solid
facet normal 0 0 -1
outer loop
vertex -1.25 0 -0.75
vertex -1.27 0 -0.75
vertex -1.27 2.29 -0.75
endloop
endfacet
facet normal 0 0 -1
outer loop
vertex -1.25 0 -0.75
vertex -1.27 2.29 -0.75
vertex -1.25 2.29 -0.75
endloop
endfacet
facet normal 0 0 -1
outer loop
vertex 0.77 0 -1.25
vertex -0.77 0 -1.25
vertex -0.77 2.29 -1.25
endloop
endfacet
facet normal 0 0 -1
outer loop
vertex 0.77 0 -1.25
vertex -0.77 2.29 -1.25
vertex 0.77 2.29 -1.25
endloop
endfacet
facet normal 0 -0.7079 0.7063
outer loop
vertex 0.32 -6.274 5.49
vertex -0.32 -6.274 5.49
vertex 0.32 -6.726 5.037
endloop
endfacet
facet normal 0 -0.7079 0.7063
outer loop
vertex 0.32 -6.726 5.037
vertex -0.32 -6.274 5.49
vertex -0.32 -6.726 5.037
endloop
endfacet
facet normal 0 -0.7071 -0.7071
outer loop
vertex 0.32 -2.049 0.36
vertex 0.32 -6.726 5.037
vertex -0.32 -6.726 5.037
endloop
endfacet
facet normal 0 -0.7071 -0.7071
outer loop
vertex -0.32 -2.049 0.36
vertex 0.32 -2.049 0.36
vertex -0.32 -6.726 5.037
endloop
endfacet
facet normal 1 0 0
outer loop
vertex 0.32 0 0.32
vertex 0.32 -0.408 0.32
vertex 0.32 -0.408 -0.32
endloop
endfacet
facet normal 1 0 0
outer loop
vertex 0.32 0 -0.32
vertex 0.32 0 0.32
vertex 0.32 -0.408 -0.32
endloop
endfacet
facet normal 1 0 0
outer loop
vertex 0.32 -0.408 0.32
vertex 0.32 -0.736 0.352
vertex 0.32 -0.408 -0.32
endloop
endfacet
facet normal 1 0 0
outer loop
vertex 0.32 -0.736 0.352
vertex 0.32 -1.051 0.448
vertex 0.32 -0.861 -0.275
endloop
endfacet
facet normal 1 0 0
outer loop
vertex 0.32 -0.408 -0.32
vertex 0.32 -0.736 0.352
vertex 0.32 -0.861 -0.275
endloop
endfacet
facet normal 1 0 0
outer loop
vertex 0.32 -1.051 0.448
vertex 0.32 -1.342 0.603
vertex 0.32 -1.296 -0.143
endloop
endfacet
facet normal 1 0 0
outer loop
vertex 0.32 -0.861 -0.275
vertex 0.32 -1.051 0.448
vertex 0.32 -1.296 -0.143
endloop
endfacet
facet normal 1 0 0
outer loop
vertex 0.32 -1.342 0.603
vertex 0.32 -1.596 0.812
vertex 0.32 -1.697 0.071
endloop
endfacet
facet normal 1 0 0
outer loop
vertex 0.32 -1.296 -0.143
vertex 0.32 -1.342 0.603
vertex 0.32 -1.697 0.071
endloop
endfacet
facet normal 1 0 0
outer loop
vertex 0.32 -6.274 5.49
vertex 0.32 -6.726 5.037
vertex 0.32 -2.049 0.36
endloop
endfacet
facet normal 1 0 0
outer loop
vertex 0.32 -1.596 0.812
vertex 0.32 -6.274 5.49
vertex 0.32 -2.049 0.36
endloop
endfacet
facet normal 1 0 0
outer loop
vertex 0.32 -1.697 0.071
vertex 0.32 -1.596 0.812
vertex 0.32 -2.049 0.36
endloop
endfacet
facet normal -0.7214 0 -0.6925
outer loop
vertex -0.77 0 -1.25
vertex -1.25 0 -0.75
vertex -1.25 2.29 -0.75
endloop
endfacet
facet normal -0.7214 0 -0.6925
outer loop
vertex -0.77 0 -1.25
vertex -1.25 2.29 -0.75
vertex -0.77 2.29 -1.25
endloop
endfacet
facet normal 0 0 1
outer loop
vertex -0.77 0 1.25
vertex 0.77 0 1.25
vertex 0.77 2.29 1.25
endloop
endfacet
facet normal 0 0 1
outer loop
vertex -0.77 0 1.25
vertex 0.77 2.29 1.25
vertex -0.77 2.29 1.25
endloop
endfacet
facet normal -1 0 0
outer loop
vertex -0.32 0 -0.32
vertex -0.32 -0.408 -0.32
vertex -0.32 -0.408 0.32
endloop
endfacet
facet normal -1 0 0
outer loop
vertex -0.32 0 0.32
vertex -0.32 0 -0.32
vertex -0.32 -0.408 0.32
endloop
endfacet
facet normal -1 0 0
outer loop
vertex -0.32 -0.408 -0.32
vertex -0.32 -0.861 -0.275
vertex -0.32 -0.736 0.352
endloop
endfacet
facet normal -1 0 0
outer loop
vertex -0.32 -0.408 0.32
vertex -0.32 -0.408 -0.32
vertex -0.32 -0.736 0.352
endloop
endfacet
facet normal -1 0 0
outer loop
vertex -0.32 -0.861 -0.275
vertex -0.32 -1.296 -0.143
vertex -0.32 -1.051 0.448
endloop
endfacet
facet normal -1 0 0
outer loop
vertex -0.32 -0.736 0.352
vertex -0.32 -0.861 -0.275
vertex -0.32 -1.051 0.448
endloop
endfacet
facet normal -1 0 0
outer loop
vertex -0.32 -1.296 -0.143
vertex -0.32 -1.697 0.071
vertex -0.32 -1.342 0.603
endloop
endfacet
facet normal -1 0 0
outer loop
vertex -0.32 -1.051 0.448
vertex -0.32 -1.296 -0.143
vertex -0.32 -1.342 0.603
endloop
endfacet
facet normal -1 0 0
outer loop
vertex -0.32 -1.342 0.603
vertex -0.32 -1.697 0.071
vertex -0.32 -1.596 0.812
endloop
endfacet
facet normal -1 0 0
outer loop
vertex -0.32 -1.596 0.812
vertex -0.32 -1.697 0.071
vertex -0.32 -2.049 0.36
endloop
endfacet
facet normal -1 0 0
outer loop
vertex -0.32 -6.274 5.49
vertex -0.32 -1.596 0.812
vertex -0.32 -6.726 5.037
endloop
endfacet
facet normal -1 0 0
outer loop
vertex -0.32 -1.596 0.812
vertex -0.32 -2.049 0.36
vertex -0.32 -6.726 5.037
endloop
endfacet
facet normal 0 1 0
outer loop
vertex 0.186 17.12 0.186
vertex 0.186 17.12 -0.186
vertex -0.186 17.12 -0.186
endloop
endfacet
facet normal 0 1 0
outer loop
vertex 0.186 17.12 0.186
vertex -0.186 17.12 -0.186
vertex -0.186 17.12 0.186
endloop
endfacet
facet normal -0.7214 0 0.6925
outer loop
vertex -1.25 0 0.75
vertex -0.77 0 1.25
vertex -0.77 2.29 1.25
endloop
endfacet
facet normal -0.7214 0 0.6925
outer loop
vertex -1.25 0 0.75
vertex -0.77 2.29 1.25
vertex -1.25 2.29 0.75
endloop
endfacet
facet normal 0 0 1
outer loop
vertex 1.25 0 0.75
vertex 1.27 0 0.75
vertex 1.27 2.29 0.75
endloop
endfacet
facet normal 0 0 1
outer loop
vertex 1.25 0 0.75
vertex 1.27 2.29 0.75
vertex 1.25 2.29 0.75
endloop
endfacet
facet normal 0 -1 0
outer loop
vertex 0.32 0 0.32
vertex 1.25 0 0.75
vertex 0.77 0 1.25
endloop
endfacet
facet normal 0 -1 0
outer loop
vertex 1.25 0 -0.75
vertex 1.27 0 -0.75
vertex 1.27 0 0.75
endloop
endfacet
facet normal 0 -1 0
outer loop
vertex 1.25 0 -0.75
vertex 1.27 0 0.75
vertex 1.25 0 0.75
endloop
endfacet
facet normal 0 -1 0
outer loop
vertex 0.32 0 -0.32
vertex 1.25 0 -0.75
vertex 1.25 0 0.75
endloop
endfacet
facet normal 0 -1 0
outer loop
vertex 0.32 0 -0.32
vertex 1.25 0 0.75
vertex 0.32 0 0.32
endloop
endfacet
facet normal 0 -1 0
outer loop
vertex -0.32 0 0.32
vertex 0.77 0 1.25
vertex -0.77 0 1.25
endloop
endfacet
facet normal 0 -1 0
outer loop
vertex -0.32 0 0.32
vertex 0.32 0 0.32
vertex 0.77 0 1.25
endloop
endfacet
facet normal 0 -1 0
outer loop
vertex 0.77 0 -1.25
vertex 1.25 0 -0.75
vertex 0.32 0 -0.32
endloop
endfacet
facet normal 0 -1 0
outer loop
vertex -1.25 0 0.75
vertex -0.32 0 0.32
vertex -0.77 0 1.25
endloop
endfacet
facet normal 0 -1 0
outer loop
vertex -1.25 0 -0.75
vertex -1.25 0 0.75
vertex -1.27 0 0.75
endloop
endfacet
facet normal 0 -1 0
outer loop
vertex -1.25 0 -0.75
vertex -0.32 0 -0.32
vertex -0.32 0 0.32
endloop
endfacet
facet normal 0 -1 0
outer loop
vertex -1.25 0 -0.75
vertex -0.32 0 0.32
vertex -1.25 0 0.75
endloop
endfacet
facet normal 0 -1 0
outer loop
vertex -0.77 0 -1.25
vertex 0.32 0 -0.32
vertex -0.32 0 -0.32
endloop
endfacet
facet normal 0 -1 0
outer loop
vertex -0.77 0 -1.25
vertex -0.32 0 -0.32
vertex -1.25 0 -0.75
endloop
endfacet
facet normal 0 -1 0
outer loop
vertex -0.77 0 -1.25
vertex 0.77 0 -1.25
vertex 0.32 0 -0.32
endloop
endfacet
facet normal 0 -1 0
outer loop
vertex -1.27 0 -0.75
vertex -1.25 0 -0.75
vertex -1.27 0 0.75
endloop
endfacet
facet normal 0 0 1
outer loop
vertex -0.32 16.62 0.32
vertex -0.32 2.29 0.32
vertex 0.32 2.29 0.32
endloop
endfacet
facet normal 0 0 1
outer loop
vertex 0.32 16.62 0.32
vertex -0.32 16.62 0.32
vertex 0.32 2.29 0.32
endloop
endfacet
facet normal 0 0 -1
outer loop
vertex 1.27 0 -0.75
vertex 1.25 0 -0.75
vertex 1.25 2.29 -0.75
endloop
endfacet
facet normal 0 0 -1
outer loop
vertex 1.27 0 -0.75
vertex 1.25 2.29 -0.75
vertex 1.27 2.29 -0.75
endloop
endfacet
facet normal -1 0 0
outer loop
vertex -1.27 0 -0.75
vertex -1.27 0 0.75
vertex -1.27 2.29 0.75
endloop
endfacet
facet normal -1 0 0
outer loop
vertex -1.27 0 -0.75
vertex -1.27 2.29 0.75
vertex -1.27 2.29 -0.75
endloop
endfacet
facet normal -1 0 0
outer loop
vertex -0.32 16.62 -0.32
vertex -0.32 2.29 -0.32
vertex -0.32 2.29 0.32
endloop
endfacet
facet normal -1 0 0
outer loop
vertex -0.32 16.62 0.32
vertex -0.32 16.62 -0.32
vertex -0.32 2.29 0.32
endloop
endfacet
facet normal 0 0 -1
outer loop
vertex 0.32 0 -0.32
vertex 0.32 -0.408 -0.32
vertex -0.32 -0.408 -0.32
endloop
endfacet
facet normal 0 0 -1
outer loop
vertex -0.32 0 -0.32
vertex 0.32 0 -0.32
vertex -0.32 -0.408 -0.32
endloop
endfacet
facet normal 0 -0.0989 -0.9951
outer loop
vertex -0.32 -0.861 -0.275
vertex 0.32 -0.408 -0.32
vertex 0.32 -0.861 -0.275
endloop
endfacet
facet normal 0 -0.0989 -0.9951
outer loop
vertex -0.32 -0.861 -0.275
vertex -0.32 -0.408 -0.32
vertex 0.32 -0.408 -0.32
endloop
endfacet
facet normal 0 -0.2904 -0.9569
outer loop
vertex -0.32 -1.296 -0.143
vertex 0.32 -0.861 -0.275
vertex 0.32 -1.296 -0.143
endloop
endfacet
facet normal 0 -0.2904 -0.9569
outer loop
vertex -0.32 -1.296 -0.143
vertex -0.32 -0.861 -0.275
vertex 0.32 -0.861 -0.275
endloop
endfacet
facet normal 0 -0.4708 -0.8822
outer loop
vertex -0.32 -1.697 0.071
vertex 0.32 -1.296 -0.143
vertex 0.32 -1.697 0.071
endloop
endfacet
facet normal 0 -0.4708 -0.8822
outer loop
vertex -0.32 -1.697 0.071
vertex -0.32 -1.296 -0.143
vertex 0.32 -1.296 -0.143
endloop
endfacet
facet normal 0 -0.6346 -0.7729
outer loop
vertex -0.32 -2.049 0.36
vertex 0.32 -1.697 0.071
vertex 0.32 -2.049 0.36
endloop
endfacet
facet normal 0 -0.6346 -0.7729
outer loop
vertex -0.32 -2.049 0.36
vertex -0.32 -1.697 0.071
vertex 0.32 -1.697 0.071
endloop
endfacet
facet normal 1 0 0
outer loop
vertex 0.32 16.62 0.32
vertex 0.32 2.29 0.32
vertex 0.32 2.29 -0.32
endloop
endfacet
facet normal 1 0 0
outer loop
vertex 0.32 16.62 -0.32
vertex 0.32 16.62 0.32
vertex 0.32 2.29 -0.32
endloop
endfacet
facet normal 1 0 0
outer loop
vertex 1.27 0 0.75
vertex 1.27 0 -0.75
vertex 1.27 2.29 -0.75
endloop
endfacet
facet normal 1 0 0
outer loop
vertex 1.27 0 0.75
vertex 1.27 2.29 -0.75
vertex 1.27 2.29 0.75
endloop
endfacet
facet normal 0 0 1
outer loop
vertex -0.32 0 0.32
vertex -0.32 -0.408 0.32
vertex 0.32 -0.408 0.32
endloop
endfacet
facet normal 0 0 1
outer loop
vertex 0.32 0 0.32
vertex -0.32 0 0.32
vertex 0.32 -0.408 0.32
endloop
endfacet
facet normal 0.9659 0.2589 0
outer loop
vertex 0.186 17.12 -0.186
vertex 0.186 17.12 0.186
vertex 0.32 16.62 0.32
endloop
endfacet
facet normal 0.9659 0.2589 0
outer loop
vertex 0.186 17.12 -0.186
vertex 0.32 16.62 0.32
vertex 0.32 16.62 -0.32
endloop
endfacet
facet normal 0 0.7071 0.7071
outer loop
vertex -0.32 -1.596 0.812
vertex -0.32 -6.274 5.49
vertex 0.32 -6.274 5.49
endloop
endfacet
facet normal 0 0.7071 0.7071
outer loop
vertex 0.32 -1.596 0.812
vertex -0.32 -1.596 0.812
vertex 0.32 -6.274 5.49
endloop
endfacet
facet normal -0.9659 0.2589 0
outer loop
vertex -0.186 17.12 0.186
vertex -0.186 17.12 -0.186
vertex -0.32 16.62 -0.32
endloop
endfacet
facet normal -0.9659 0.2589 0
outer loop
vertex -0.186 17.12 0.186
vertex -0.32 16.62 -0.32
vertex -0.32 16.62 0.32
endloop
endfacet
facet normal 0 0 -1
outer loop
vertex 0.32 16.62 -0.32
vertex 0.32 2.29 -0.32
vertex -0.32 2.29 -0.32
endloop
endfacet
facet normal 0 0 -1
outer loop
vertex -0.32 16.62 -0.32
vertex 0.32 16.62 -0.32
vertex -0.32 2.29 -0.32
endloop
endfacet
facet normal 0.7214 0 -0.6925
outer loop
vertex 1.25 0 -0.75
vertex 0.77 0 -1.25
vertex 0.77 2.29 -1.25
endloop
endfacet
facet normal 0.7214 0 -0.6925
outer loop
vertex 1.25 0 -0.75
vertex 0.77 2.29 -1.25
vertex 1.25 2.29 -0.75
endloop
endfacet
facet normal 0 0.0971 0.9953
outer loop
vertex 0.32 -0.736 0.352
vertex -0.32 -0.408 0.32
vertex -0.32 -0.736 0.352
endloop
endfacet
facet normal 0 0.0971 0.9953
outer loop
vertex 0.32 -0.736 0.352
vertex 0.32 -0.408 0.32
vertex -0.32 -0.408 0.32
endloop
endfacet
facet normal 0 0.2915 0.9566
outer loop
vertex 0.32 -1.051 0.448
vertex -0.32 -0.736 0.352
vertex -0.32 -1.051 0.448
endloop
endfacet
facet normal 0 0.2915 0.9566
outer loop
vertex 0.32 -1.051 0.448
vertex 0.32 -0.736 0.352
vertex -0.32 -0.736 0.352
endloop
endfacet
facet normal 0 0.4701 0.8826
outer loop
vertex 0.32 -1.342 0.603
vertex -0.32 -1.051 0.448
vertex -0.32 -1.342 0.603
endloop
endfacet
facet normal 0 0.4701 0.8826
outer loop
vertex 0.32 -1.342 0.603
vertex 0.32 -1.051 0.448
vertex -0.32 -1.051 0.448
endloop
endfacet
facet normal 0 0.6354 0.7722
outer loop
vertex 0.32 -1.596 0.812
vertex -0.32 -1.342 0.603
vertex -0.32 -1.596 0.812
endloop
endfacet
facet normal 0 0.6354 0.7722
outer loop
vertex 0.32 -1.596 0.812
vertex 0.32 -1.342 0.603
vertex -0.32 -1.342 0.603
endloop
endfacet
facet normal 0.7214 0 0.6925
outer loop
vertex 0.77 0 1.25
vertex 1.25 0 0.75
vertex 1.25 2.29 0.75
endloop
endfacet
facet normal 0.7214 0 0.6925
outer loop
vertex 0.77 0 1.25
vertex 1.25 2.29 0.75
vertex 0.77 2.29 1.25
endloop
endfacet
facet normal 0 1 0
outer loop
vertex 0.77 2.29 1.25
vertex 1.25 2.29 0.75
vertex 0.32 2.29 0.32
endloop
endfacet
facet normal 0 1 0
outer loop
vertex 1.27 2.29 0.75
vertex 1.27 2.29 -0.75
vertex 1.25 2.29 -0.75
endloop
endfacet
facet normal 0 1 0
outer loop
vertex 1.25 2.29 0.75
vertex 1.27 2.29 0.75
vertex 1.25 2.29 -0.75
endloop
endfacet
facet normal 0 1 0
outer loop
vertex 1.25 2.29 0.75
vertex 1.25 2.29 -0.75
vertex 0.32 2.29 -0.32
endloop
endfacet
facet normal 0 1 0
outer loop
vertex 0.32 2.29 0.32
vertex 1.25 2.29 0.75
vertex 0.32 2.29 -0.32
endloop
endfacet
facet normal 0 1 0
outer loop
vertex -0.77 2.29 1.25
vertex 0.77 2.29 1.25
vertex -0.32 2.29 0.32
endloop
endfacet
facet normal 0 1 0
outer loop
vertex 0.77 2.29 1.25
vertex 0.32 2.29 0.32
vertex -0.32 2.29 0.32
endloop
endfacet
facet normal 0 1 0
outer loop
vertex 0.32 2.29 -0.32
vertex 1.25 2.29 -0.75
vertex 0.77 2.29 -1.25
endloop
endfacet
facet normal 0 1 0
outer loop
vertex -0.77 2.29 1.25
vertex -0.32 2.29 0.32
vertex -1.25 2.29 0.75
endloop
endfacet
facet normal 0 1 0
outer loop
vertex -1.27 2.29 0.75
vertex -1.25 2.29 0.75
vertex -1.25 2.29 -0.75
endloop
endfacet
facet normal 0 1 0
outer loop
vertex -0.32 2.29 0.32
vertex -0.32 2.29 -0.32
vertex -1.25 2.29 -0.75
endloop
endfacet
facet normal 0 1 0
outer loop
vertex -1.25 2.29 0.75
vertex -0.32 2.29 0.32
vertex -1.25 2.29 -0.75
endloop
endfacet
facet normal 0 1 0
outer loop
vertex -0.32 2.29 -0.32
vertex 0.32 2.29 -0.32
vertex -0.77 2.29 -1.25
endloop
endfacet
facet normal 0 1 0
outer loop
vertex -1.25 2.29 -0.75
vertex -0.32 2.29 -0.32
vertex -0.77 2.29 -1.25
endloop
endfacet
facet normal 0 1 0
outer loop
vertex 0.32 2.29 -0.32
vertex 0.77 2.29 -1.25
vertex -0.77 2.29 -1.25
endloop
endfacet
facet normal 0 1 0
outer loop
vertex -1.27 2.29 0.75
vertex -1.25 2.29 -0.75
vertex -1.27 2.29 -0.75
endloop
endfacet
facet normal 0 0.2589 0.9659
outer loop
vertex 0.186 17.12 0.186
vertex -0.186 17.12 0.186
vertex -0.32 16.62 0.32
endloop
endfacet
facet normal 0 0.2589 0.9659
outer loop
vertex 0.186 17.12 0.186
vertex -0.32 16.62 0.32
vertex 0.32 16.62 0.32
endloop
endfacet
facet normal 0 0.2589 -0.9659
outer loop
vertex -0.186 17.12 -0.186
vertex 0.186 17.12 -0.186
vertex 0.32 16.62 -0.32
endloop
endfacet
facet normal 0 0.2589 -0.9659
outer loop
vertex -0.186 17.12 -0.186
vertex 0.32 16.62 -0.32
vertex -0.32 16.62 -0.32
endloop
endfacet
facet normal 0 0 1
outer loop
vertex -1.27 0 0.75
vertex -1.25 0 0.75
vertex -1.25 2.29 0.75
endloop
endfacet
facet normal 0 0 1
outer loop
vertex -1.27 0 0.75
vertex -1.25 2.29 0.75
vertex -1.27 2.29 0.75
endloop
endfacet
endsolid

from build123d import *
from OCP.BRepFilletAPI import BRepFilletAPI_MakeChamfer

# Parameters (mm, degrees)
BOSS_EXTRUDE1_DEPTH = 2.29
SKETCH3_W           = 0.64
SKETCH3_H           = 0.64
CHAMFER3_SIZE       = 0.5
CHAMFER3_SIZE2      = 0.133974596


with BuildPart() as part:
    # Sketch1 → Boss-Extrude1 (new body)
    with BuildSketch(Plane(origin=(0, 0, 0), x_dir=(1, 0, 0), z_dir=(0, 1, 0))):
        Polygon((-0.77, 1.25), (0.77, 1.25), (1.25, 0.75), (1.27, 0.75), (1.27, -0.75), (1.25, -0.75), (0.77, -1.25), (-0.77, -1.25), (-1.25, -0.75), (-1.27, -0.75), (-1.27, 0.75), (-1.25, 0.75), align=None)
    extrude(amount=BOSS_EXTRUDE1_DEPTH)

    # Sweep1: sweep along a path in Sketch2
    with BuildLine(Plane(origin=(0, 0, 0), x_dir=(0, 0, -1), z_dir=(1, 0, 0))) as sweep1_path:
        Line((0, 17.12), (0, -0.408142235))
        ThreePointArc((0, -0.408142235), (-0.152240935, -1.1735091), (-0.585786438, -1.822355798))
        Line((-0.585786438, -1.822355798), (-5.26343064, -6.5))
    # Sketch3 → Sweep1 (sweep)
    with BuildSketch(Plane(origin=(0, 17.12, 0), x_dir=(1, 0, 0), z_dir=(0, 1, 0))):
        Rectangle(SKETCH3_W, SKETCH3_H)
    sweep(path=sweep1_path.line)

    # Chamfer3: one chamfer whose edges measure the first distance from different faces: ONE call of the kernel's chamfer builder (chamfer() names one face for all edges)
    chamfer3_edges_1 = [part.edges().sort_by_distance(p)[0] for p in [
        (0.32, 17.12, 0),
    ]]
    chamfer3_side_1 = [part.faces().sort_by_distance(p)[0] for p in [
        (0.32, 9.705, 0),
    ]]
    chamfer3_edges_2 = [part.edges().sort_by_distance(p)[0] for p in [
        (0, 17.12, -0.32),
    ]]
    chamfer3_side_2 = [part.faces().sort_by_distance(p)[0] for p in [
        (0, 9.705, -0.32),
    ]]
    chamfer3_edges_3 = [part.edges().sort_by_distance(p)[0] for p in [
        (-0.32, 17.12, 0),
    ]]
    chamfer3_side_3 = [part.faces().sort_by_distance(p)[0] for p in [
        (-0.32, 9.705, 0),
    ]]
    chamfer3_edges_4 = [part.edges().sort_by_distance(p)[0] for p in [
        (0, 17.12, 0.32),
    ]]
    chamfer3_side_4 = [part.faces().sort_by_distance(p)[0] for p in [
        (0, 9.705, 0.32),
    ]]
    chamfer3 = BRepFilletAPI_MakeChamfer(part.part.solid().wrapped)
    for e in chamfer3_edges_1:
        chamfer3.Add(CHAMFER3_SIZE, CHAMFER3_SIZE2, e.wrapped, chamfer3_side_1[0].wrapped)  # the first distance lies on this face
    for e in chamfer3_edges_2:
        chamfer3.Add(CHAMFER3_SIZE, CHAMFER3_SIZE2, e.wrapped, chamfer3_side_2[0].wrapped)  # the first distance lies on this face
    for e in chamfer3_edges_3:
        chamfer3.Add(CHAMFER3_SIZE, CHAMFER3_SIZE2, e.wrapped, chamfer3_side_3[0].wrapped)  # the first distance lies on this face
    for e in chamfer3_edges_4:
        chamfer3.Add(CHAMFER3_SIZE, CHAMFER3_SIZE2, e.wrapped, chamfer3_side_4[0].wrapped)  # the first distance lies on this face
    add(Compound.cast(chamfer3.Shape()), mode=Mode.REPLACE)


solid = part.part
